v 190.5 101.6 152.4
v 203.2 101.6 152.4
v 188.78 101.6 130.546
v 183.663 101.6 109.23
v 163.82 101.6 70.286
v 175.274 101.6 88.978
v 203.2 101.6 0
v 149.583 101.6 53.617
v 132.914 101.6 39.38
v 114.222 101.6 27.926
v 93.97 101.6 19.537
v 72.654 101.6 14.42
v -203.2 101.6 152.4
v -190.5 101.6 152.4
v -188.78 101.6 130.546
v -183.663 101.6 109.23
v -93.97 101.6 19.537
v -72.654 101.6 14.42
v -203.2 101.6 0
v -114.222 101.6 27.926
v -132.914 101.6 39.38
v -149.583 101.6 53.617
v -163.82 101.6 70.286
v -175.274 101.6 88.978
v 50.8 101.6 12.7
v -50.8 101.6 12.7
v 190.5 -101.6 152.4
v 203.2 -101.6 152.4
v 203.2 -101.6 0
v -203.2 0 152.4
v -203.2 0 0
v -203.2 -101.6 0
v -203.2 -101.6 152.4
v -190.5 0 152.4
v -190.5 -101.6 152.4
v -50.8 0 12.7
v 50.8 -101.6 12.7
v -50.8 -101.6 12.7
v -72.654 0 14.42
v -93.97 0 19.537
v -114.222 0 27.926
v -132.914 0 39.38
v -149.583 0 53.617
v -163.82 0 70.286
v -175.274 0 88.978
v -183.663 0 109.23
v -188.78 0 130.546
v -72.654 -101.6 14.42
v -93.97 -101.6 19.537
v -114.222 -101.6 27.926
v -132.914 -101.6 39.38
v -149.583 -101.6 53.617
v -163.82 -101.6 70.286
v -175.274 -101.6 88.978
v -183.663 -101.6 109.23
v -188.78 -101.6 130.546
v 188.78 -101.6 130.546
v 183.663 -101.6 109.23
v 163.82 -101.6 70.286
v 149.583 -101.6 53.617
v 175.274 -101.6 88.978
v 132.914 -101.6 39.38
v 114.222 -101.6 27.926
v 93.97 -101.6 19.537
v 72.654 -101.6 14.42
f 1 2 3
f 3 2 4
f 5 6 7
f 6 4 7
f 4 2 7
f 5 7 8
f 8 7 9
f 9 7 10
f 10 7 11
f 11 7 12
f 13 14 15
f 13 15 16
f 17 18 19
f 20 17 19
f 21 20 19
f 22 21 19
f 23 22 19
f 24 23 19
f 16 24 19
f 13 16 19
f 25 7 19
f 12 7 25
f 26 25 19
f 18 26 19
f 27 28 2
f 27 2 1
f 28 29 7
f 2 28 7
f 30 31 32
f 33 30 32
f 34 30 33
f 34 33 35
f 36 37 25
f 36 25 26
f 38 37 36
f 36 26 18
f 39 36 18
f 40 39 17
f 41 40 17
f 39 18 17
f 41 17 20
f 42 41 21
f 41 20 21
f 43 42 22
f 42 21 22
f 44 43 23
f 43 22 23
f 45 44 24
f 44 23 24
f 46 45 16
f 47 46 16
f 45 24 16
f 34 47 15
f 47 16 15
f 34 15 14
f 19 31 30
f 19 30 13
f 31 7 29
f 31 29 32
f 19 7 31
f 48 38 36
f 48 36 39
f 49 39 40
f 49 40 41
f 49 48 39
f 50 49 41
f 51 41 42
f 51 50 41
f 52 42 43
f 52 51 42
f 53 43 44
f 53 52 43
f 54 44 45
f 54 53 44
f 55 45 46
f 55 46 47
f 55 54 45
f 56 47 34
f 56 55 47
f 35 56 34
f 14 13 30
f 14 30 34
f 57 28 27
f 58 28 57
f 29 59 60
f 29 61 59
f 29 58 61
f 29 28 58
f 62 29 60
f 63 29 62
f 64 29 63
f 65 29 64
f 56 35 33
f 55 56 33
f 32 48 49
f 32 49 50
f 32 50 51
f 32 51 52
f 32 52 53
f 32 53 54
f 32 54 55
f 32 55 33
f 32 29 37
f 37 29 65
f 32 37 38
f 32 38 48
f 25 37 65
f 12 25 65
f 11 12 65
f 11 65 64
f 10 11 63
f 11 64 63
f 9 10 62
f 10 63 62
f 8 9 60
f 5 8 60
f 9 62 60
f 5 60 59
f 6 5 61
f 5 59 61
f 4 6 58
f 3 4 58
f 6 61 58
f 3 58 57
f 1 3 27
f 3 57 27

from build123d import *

# Parameters (mm, degrees)
F0_W     = 152.4
F0_H     = 101.6
F1_DEPTH = 152.4
F3_D     = 279.4
F0_W_2   = 50.8
F4_DEPTH = 12.7


with BuildPart() as f1:
    # F0 (on Top) → F1 (new body)
    with BuildSketch(Plane.XY):
        with Locations((-127, 50.8)):
            Rectangle(F0_W, F0_H)
    extrude(amount=F1_DEPTH)

    # F3 (through all)
    with Locations(Plane.XZ):
        with Locations((-50.8, 152.4)):
            Hole(F3_D / 2)

    # F0 (on Top) → F4 (join)
    with BuildSketch(Plane.XY):
        with Locations((-25.4, 50.8)):
            Rectangle(F0_W_2, F0_H)
    extrude(amount=F4_DEPTH)

    # F5: F1 across plane


with BuildPart() as f1_1:
    add(f1.part)
    add(f1.part.mirror(Plane.XZ))

    # F6: F1 across plane


with BuildPart() as f1_2:
    add(f1_1.part)
    add(f1_1.part.mirror(Plane.YZ))


solid = f1_2.part
